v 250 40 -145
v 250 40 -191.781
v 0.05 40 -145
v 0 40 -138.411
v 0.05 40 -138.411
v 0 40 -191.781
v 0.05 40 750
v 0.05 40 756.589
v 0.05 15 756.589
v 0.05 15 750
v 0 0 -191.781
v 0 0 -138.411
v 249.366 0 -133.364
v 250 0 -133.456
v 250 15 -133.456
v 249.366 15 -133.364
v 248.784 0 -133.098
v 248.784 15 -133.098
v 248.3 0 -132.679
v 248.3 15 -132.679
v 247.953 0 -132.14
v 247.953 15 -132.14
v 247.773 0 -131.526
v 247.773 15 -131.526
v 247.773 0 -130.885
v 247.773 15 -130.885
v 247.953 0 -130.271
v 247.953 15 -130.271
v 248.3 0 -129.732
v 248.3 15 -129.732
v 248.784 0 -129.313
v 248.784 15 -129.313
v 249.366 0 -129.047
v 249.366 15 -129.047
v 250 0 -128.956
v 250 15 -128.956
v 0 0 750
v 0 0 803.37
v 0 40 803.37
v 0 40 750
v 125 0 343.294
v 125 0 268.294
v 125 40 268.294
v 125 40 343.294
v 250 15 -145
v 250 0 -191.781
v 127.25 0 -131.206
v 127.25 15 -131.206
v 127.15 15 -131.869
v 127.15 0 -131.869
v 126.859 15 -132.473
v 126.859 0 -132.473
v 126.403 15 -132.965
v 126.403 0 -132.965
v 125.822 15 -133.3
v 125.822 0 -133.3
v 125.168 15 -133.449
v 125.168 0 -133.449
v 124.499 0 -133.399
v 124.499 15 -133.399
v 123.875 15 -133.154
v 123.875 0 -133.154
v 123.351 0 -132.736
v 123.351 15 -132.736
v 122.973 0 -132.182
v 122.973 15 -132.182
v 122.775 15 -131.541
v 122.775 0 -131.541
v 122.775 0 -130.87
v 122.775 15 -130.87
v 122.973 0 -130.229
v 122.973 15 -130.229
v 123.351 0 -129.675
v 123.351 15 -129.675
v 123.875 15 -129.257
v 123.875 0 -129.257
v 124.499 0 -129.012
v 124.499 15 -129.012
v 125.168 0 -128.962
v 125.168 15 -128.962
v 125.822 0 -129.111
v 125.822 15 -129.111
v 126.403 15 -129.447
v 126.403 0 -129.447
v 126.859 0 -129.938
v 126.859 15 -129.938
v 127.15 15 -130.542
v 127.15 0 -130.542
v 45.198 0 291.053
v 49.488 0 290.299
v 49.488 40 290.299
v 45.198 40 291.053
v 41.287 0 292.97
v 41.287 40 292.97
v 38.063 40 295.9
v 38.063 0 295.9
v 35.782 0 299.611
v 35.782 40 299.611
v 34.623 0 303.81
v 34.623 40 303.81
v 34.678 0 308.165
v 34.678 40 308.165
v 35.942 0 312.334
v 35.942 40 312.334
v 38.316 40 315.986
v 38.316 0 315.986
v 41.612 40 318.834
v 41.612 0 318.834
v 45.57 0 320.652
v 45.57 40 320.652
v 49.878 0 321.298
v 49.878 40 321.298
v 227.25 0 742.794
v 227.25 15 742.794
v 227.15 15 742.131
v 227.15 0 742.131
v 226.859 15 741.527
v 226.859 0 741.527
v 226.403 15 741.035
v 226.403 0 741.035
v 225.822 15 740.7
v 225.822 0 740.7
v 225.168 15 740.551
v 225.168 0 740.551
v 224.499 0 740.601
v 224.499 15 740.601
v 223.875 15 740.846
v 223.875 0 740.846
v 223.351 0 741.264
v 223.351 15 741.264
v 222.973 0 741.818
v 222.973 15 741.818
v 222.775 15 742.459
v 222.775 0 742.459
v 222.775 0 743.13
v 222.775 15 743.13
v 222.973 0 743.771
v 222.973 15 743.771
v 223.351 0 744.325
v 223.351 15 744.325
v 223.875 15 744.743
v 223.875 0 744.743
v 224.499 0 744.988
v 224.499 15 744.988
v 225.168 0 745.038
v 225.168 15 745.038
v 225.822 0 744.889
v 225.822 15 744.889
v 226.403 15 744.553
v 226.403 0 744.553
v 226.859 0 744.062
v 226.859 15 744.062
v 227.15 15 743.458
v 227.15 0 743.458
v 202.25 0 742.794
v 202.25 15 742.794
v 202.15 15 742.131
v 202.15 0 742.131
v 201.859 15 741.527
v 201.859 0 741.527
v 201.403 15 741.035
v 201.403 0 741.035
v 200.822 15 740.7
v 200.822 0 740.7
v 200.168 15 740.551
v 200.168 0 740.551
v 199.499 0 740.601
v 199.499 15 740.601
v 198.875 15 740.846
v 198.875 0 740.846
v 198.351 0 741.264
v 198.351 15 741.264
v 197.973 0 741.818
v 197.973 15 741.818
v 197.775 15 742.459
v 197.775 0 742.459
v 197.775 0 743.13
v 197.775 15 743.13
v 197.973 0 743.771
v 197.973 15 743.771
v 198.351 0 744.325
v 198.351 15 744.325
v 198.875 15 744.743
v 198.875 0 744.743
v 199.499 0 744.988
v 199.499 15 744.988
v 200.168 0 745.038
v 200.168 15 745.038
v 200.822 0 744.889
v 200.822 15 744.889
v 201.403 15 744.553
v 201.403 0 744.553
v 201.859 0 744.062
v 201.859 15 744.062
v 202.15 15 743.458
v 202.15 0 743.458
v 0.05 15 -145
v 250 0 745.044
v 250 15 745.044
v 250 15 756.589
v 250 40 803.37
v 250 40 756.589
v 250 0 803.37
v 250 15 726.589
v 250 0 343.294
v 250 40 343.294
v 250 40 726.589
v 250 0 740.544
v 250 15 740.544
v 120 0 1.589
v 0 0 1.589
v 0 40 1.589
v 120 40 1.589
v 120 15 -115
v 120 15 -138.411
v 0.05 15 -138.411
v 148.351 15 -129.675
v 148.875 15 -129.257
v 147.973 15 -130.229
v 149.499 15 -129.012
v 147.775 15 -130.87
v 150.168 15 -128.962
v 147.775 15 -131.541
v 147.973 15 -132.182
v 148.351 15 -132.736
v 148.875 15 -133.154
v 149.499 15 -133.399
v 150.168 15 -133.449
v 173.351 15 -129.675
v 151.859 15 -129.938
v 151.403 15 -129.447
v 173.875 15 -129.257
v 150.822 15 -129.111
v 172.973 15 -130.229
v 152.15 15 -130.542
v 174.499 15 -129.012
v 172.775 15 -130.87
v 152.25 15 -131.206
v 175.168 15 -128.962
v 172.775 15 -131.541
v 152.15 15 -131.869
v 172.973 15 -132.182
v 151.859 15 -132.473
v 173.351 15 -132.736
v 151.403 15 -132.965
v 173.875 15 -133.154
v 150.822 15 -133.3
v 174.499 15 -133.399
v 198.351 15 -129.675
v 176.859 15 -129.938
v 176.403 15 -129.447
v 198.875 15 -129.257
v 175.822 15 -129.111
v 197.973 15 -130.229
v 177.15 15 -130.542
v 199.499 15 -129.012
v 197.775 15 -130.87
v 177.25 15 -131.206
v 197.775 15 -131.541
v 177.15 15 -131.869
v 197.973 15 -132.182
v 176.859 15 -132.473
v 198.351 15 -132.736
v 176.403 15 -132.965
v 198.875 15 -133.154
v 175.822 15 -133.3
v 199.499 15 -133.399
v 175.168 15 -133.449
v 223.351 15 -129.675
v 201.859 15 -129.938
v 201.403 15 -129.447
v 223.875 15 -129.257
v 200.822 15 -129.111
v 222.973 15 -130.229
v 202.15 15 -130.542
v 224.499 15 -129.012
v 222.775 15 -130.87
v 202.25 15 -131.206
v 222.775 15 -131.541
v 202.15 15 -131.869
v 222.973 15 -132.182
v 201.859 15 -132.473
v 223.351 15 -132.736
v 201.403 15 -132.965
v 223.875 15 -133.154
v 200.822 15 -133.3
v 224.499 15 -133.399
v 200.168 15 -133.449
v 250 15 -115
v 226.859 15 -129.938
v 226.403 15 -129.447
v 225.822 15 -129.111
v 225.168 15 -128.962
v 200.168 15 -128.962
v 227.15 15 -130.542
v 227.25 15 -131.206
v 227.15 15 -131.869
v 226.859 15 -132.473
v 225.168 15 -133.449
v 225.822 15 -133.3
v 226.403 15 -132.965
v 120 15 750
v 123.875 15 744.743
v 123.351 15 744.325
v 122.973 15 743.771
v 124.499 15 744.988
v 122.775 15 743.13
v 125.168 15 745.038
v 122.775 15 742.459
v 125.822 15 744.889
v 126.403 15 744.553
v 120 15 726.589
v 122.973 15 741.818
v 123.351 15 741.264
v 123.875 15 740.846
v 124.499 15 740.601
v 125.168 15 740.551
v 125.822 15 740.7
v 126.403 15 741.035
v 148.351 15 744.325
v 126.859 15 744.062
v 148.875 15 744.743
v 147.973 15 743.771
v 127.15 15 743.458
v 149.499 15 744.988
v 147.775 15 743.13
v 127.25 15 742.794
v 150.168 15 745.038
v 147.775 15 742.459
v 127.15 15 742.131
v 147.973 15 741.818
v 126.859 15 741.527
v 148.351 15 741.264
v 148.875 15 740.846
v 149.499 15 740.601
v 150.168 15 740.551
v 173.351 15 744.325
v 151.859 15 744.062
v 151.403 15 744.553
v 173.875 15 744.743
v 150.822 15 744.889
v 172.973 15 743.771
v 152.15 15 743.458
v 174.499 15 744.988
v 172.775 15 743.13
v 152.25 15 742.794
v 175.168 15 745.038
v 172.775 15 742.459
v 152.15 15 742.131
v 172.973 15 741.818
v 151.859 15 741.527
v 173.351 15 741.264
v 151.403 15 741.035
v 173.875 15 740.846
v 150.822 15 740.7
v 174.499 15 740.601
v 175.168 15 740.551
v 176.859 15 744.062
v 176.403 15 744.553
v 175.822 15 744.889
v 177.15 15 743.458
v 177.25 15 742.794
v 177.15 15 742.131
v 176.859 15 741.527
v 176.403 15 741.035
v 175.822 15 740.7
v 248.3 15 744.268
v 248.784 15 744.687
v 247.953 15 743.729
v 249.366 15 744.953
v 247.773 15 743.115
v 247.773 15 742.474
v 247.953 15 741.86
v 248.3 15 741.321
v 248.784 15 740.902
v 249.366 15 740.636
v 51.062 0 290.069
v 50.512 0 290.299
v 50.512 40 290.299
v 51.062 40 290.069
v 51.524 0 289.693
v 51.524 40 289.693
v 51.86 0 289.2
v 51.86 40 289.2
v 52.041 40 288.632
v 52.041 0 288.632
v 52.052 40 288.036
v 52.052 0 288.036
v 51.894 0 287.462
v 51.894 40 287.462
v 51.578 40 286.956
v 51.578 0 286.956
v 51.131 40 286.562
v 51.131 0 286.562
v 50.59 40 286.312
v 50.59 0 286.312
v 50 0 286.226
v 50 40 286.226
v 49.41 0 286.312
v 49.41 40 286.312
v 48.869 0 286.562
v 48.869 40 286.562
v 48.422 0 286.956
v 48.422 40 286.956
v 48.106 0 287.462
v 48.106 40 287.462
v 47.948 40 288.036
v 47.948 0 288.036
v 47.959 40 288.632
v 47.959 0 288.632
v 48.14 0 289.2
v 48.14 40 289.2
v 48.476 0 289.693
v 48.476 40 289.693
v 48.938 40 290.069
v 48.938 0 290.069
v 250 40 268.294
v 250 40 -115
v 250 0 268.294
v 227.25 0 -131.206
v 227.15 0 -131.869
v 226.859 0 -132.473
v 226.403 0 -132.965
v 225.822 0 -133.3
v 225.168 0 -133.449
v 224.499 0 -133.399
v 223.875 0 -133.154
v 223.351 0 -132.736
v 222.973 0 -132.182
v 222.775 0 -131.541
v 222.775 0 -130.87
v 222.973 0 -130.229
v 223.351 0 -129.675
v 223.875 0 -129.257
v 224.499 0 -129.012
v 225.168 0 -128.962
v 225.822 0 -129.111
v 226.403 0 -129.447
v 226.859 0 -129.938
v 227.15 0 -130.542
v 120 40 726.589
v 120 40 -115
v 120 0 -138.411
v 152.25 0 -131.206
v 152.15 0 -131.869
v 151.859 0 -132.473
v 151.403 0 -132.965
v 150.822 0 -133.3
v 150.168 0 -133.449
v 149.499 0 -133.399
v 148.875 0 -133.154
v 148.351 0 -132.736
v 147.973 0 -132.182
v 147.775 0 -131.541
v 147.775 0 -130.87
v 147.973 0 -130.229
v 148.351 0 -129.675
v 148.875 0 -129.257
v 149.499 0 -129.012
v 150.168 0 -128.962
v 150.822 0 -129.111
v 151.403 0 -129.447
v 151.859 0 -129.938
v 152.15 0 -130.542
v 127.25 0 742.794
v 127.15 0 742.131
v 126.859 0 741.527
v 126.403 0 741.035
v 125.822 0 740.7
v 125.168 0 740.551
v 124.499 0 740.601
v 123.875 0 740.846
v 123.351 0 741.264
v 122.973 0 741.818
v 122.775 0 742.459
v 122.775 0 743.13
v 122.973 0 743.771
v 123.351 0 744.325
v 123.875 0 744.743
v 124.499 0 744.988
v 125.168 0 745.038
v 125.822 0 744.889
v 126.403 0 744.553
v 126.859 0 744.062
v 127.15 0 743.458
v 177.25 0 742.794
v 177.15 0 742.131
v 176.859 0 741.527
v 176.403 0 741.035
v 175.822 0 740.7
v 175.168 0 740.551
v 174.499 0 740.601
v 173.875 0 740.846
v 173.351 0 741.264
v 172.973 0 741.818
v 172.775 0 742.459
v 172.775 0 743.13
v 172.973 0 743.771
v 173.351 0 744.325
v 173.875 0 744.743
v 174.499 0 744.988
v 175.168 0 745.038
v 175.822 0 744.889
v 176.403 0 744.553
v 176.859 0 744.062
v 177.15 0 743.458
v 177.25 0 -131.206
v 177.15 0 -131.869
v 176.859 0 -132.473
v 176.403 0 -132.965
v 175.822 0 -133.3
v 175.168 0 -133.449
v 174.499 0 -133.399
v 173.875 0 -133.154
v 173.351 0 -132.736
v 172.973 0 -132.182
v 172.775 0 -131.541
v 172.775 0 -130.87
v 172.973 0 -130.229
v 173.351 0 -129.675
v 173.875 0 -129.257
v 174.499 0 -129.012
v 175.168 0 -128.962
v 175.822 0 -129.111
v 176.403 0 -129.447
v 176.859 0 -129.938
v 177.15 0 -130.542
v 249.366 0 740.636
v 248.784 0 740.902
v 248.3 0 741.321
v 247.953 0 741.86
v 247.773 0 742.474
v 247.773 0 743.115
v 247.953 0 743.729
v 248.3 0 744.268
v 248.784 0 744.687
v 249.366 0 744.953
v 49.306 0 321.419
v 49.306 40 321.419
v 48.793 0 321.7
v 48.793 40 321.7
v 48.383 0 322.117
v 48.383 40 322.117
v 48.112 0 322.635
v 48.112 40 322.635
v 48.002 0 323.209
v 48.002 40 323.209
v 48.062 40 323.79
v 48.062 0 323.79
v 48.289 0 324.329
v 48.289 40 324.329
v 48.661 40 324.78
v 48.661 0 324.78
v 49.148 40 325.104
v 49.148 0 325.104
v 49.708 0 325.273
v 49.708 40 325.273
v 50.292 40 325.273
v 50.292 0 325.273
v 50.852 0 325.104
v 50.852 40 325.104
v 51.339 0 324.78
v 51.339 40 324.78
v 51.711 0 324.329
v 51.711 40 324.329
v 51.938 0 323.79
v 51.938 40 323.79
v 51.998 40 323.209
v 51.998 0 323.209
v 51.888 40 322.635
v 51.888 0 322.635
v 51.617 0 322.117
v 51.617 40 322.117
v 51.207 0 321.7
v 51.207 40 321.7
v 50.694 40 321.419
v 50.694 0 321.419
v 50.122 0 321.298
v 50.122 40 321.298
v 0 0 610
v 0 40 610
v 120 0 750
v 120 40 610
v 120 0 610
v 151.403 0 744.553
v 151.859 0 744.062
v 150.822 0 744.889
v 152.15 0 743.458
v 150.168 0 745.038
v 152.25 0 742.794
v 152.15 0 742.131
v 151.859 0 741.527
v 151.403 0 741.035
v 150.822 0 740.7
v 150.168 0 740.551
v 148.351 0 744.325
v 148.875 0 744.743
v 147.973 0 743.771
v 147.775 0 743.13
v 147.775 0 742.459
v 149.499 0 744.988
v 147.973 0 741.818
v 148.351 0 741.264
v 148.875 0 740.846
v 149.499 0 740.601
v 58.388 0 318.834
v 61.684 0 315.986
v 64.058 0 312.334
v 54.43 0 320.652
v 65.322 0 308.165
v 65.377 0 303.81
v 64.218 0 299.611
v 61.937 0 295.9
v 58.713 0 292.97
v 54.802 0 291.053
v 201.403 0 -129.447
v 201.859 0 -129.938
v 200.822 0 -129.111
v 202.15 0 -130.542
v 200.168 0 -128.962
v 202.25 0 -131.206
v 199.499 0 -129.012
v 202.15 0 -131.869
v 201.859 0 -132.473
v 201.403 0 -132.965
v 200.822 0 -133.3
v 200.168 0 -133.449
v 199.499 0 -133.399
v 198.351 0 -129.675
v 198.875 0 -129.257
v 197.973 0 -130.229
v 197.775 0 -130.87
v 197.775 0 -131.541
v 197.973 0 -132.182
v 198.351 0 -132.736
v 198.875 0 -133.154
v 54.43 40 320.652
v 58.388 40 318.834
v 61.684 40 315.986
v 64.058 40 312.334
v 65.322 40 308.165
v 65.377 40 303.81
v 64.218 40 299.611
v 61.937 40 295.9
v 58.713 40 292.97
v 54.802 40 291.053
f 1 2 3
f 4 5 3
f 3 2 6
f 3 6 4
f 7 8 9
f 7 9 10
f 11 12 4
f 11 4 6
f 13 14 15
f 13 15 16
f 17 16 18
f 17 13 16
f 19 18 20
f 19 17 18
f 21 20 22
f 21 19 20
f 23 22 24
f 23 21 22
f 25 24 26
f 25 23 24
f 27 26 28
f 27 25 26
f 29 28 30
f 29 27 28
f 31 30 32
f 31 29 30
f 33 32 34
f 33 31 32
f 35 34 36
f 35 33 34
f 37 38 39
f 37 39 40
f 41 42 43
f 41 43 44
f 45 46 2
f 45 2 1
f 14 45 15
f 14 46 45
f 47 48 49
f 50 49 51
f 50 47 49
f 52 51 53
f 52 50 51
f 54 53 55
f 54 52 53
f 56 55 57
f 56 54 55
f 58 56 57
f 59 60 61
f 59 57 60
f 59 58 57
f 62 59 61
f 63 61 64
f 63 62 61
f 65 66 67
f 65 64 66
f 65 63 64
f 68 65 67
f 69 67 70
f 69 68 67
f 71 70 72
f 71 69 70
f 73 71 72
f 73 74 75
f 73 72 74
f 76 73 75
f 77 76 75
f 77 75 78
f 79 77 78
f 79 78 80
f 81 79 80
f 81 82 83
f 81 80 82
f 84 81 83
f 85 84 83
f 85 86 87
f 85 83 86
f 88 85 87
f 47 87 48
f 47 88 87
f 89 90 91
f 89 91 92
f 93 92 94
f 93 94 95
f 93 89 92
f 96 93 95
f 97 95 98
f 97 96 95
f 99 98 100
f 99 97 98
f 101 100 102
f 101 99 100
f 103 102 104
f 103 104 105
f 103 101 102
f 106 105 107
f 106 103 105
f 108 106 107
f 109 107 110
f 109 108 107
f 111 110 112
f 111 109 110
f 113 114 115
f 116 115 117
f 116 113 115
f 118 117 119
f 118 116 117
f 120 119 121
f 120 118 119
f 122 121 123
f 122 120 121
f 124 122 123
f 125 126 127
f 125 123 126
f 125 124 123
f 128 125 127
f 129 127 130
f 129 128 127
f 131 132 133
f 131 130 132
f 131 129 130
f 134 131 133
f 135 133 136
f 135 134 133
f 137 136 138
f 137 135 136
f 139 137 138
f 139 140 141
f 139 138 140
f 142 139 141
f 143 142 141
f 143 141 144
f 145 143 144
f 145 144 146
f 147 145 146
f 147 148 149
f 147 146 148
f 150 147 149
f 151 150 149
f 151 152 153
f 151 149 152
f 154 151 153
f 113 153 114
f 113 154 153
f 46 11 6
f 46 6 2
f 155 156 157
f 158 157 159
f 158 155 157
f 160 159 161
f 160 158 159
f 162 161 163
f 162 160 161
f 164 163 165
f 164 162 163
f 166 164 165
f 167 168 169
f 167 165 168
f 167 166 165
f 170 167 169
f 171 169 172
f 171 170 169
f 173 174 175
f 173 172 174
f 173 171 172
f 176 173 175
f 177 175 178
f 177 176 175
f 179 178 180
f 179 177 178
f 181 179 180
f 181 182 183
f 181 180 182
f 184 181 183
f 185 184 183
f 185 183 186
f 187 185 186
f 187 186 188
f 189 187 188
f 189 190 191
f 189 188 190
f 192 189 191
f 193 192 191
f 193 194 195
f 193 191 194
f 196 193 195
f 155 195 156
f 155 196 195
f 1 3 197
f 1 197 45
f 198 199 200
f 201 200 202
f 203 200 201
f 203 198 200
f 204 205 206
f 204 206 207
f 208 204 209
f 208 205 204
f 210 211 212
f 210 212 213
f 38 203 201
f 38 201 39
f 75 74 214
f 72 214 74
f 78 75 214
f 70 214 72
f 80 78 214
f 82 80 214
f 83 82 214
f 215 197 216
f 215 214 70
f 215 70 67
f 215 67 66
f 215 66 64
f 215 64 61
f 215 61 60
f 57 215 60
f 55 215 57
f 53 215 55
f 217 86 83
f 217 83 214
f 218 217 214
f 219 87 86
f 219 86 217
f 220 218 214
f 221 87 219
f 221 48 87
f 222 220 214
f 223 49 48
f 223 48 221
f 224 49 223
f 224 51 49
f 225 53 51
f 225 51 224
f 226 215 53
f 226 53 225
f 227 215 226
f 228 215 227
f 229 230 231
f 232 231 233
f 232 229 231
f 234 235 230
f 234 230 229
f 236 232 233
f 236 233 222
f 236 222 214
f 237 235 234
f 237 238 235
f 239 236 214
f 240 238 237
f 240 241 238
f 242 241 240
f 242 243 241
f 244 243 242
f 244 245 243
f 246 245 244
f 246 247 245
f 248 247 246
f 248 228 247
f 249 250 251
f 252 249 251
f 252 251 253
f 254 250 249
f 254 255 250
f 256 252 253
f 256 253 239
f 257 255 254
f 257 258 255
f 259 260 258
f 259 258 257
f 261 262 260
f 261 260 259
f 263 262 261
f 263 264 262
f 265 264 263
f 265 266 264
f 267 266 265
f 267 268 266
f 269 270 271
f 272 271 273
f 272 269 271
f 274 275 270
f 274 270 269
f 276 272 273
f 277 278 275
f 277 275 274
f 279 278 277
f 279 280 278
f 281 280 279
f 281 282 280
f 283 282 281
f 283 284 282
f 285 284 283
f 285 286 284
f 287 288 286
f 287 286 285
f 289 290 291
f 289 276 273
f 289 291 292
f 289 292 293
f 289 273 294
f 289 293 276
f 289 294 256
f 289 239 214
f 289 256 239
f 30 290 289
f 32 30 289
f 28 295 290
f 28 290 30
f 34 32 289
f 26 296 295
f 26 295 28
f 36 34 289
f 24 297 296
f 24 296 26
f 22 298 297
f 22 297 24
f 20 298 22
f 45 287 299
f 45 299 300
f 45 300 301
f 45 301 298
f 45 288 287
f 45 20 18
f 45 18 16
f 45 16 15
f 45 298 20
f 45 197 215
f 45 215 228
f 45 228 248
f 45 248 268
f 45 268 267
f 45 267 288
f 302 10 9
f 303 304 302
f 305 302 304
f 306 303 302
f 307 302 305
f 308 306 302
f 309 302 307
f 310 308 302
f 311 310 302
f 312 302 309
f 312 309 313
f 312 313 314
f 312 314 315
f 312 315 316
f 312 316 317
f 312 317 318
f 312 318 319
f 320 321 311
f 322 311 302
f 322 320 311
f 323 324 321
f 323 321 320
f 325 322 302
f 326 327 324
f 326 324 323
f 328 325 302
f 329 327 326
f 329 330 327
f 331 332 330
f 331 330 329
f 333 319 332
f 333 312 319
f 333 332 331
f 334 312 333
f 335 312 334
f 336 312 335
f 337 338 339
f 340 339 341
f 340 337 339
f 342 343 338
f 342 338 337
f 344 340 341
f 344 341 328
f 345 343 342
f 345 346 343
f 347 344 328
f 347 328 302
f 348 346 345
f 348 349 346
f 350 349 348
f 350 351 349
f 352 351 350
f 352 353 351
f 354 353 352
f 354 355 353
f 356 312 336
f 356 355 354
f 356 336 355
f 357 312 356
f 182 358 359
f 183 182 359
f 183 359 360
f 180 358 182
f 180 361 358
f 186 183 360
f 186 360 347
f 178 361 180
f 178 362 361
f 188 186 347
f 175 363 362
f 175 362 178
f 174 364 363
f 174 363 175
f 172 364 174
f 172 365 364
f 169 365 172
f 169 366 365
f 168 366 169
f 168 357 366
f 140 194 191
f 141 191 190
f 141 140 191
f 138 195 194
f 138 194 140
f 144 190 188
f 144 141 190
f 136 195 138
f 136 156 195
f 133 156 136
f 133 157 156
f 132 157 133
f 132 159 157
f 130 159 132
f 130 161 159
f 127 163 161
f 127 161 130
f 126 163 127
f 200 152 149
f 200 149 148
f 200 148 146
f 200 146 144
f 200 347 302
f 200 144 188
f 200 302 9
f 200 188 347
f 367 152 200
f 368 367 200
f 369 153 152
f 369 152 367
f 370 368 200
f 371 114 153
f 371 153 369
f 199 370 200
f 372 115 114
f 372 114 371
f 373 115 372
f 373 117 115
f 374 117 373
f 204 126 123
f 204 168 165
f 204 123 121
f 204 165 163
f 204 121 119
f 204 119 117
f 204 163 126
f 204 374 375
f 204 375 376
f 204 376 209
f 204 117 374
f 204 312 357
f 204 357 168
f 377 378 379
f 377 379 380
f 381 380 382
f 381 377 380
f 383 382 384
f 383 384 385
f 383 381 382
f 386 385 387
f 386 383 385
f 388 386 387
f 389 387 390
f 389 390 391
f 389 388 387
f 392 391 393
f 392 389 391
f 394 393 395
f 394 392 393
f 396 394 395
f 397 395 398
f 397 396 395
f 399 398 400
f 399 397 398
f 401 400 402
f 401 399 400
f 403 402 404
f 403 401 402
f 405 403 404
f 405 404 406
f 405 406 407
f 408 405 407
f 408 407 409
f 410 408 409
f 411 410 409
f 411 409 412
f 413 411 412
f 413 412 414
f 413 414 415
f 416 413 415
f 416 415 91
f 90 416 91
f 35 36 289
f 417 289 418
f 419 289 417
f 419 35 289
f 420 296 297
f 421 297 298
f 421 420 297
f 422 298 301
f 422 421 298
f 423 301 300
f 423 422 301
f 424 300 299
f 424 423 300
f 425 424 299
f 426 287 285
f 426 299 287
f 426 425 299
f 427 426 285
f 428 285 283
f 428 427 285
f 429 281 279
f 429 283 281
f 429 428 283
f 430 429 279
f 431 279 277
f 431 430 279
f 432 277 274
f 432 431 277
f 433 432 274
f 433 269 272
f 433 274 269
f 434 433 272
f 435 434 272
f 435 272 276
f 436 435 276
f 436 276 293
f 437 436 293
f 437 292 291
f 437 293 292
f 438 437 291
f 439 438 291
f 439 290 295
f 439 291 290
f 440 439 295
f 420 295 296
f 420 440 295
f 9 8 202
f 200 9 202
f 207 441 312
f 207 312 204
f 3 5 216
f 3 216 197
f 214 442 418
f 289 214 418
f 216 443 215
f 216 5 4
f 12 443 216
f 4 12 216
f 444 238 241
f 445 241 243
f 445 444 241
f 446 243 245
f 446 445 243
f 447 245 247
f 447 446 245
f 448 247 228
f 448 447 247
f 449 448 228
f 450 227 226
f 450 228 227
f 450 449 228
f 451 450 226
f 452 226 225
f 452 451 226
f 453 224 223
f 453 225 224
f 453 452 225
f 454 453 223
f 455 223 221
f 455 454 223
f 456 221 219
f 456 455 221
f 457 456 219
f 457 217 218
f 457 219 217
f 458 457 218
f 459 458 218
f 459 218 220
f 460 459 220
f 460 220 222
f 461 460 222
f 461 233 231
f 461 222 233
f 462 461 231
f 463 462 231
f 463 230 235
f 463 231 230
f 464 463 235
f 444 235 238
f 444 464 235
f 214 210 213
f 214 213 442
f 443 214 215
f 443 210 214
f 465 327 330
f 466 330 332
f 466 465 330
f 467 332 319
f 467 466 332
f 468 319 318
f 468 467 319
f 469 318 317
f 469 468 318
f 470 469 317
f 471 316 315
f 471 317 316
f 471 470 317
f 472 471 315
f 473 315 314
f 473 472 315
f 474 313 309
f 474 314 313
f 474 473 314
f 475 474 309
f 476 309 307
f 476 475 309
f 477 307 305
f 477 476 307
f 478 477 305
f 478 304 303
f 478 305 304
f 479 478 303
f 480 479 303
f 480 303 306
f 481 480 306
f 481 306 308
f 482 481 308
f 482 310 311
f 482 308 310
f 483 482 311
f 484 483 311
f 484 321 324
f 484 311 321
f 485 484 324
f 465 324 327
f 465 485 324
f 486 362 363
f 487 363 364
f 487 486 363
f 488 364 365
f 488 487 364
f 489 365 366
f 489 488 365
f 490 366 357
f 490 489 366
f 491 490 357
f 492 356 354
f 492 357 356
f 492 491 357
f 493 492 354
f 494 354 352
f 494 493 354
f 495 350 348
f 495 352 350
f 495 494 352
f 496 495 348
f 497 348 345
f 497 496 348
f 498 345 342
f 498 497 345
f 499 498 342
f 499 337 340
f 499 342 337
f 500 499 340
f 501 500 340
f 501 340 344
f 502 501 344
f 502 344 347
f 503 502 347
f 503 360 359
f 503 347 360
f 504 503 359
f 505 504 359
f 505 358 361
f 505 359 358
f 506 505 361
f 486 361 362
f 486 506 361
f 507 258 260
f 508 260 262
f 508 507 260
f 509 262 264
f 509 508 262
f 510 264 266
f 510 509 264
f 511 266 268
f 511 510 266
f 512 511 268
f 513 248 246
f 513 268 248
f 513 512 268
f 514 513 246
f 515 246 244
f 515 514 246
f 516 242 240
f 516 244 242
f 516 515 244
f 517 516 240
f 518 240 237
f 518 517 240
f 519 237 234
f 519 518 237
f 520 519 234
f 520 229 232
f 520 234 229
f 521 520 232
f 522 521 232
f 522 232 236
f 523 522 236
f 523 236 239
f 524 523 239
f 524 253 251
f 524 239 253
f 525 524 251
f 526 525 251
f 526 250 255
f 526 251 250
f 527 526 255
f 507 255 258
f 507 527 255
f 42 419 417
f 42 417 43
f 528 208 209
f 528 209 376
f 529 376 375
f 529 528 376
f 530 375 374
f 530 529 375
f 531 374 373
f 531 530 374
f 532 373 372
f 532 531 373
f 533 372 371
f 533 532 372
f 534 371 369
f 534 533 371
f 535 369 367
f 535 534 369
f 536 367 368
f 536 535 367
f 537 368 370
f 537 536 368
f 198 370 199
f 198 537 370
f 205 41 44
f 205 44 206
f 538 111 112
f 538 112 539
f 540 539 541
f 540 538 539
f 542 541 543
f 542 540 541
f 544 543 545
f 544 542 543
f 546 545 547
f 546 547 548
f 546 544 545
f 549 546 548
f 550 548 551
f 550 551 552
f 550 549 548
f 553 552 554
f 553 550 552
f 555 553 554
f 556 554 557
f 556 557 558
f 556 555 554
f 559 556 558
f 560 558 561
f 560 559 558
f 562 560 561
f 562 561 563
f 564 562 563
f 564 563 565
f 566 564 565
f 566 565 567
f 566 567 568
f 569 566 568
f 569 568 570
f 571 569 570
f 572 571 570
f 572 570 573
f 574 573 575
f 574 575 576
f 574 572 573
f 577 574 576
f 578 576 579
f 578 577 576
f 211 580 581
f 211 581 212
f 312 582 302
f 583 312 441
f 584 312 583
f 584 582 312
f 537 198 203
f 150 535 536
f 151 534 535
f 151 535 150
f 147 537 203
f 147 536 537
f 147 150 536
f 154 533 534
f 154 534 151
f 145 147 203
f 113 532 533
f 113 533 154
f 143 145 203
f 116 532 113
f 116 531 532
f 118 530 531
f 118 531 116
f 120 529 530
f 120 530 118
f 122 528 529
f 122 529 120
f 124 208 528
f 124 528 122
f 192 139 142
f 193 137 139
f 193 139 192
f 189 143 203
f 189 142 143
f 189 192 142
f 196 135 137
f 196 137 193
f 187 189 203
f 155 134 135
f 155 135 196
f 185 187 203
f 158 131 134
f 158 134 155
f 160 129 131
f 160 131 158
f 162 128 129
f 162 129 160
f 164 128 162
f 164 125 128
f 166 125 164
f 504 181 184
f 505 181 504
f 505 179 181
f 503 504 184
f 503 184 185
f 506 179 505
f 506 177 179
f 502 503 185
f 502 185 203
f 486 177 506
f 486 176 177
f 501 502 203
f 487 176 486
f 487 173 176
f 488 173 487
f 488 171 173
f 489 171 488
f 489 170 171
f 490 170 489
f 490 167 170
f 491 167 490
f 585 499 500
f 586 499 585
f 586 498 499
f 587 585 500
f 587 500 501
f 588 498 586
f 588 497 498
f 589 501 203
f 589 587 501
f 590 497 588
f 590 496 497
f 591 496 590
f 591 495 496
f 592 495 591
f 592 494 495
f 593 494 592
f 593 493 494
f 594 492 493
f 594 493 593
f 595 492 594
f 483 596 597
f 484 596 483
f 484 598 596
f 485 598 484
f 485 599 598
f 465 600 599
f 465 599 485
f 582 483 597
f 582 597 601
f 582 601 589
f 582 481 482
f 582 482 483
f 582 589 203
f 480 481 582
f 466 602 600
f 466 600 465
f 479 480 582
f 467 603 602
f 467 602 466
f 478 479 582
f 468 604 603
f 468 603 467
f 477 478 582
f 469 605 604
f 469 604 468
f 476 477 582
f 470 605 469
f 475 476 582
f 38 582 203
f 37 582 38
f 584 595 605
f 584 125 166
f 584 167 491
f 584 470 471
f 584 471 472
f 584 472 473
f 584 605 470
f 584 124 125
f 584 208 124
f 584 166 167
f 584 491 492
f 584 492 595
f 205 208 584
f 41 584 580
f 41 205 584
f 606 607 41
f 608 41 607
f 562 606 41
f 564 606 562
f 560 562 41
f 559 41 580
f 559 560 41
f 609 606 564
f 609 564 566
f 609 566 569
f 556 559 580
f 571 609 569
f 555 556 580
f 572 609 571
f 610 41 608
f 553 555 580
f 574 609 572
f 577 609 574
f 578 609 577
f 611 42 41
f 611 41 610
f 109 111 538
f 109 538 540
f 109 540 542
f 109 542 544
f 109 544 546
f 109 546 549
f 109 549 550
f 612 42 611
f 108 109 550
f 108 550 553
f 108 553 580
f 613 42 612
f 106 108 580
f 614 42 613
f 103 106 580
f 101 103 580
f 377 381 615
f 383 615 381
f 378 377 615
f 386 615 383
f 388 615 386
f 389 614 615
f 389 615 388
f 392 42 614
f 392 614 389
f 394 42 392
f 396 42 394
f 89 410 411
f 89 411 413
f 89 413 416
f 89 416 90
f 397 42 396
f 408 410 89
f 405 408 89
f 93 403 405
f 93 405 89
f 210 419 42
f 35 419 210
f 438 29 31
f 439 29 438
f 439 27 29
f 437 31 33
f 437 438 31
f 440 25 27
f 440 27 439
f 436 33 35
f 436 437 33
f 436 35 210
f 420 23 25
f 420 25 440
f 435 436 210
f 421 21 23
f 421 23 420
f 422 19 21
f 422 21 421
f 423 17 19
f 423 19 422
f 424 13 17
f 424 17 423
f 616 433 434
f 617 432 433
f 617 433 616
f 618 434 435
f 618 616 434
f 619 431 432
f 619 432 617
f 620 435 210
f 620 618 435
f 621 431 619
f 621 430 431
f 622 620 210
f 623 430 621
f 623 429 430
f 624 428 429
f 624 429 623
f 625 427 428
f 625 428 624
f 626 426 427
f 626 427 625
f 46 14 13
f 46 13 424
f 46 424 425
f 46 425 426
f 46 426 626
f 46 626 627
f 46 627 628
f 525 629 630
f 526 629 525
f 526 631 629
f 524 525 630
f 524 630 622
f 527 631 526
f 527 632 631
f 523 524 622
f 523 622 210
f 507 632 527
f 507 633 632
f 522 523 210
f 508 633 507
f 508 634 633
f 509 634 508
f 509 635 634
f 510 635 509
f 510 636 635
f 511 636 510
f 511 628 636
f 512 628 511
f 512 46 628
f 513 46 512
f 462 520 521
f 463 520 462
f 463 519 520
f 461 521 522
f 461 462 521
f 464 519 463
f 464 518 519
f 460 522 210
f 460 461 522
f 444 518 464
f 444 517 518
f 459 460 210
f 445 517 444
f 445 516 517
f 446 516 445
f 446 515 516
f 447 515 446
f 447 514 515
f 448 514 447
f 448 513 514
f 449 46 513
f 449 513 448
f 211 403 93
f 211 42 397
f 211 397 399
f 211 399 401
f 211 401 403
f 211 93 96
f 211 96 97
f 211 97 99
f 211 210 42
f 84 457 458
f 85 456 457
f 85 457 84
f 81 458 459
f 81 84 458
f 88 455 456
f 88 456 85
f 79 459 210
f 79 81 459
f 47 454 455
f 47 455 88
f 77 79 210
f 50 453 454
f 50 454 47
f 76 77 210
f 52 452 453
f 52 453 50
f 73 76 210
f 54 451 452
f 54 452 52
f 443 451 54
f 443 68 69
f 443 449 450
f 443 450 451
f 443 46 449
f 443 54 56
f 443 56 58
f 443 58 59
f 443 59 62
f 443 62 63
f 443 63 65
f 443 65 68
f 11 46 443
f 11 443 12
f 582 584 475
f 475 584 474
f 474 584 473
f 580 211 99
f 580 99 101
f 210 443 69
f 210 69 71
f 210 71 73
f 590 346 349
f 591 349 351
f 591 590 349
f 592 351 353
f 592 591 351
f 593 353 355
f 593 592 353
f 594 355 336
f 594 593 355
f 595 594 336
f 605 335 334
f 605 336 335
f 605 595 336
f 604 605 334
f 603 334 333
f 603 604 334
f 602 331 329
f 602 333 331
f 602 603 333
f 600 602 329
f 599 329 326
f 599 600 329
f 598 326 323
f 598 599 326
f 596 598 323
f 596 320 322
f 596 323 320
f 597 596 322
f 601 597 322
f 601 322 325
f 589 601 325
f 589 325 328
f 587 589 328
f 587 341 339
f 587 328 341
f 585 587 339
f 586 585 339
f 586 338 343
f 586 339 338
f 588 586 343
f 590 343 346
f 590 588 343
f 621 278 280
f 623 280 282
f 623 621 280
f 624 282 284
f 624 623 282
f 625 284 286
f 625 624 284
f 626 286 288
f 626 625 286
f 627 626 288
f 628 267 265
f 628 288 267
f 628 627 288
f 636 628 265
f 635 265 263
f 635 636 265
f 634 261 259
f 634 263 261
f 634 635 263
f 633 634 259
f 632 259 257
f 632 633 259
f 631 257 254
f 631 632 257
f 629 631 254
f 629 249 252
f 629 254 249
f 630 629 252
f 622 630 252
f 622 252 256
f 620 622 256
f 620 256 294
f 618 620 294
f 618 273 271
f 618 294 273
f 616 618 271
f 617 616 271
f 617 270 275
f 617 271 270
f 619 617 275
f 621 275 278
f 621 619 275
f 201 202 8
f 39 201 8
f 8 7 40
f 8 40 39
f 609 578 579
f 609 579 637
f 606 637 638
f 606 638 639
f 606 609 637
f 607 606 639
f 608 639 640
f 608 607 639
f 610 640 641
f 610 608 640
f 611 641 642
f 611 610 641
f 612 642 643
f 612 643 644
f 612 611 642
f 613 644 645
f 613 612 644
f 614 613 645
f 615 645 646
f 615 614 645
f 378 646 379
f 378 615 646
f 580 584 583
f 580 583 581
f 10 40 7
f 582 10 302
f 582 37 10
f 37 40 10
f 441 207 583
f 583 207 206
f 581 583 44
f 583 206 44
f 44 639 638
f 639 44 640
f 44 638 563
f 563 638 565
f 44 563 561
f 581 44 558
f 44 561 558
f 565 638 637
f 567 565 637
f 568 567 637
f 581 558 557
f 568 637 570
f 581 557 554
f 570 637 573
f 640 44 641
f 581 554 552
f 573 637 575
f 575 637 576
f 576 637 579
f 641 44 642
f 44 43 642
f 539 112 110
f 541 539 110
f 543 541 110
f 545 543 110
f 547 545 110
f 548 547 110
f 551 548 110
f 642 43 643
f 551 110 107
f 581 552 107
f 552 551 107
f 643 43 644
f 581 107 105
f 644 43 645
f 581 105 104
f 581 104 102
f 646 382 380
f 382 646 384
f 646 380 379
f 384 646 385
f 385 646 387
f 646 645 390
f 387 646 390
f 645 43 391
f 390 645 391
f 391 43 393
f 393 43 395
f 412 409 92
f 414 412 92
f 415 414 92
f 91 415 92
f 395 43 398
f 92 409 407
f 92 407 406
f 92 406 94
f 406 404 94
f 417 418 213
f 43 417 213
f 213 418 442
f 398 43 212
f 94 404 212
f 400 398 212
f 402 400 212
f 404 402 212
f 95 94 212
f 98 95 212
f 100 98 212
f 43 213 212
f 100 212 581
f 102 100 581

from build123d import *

# Parameters (mm, degrees)
SKETCH_R            = 2.25
BOSS_EXTRUDE3_DEPTH = 40
SKETCH1_W           = 249.949747468
SKETCH1_H           = 30
CUT_EXTRUDE1_DEPTH  = 25


with BuildPart() as part:
    # Sketch → Boss-Extrude3 (new body)
    with BuildSketch(Plane(origin=(0, 0, 0), x_dir=(1, 0, 0), z_dir=(0, 1, 0))):
        with BuildLine():
            Line((0, 191.780935723), (250, 191.780935723))
            Line((250, 191.780935723), (250, 133.455634672))
            ThreePointArc((250, 133.455634672), (247.75, 131.205634672), (250, 128.955634672))
            Line((250, 128.955634672), (250, -268.294365328))
            Line((250, -268.294365328), (125, -268.294365328))
            Line((125, -268.294365328), (125, -343.294365328))
            Line((125, -343.294365328), (250, -343.294365328))
            Line((250, -343.294365328), (250, -740.544365328))
            ThreePointArc((250, -740.544365328), (247.75, -742.794365328), (250, -745.044365328))
            Line((250, -745.044365328), (250, -803.36966638))
            Line((250, -803.36966638), (0, -803.36966638))
            Line((0, -803.36966638), (0, -750))
            Line((0, -750), (120, -750))
            Line((120, -750), (120, -610))
            Line((120, -610), (0, -610))
            Line((0, -610), (0, -1.588730657))
            Line((0, -1.588730657), (120, -1.588730657))
            Line((120, -1.588730657), (120, 138.411269343))
            Line((120, 138.411269343), (0, 138.411269343))
            Line((0, 138.411269343), (0, 191.780935723))
        make_face()
        with Locations((125, 131.205634672)):
            Circle(SKETCH_R, mode=Mode.SUBTRACT)
        with Locations((150, 131.205634672)):
            Circle(SKETCH_R, mode=Mode.SUBTRACT)
        with Locations((175, 131.205634672)):
            Circle(SKETCH_R, mode=Mode.SUBTRACT)
        with Locations((200, 131.205634672)):
            Circle(SKETCH_R, mode=Mode.SUBTRACT)
        with Locations((225, 131.205634672)):
            Circle(SKETCH_R, mode=Mode.SUBTRACT)
        with Locations((225, -742.794365328)):
            Circle(SKETCH_R, mode=Mode.SUBTRACT)
        with Locations((200, -742.794365328)):
            Circle(SKETCH_R, mode=Mode.SUBTRACT)
        with Locations((175, -742.794365328)):
            Circle(SKETCH_R, mode=Mode.SUBTRACT)
        with Locations((150, -742.794365328)):
            Circle(SKETCH_R, mode=Mode.SUBTRACT)
        with Locations((125, -742.794365328)):
            Circle(SKETCH_R, mode=Mode.SUBTRACT)
        with BuildLine():
            ThreePointArc((50.51221471, -290.298610608), (50, -286.225703188), (49.48778529, -290.298610608))
            ThreePointArc((49.48778529, -290.298610608), (34.497008873, -305.989414978), (49.877802923, -321.29810185))
            ThreePointArc((49.877802923, -321.29810185), (50, -325.294365328), (50.122197077, -321.29810185))
            ThreePointArc((50.122197077, -321.29810185), (65.502991127, -305.989414978), (50.51221471, -290.298610608))
        make_face(mode=Mode.SUBTRACT)
    extrude(amount=BOSS_EXTRUDE3_DEPTH)

    # Sketch1 → Cut-Extrude1 (cut)
    with BuildSketch(Plane(origin=(0, 40, 0), x_dir=(1, 0, 0), z_dir=(0, 1, 0))):
        with Locations((125.025126266, 130)):
            Rectangle(SKETCH1_W, SKETCH1_H)
        with Locations((125.025126266, -741.588730657)):
            Rectangle(SKETCH1_W, SKETCH1_H)
    extrude(amount=-CUT_EXTRUDE1_DEPTH, mode=Mode.SUBTRACT)


solid = part.part
